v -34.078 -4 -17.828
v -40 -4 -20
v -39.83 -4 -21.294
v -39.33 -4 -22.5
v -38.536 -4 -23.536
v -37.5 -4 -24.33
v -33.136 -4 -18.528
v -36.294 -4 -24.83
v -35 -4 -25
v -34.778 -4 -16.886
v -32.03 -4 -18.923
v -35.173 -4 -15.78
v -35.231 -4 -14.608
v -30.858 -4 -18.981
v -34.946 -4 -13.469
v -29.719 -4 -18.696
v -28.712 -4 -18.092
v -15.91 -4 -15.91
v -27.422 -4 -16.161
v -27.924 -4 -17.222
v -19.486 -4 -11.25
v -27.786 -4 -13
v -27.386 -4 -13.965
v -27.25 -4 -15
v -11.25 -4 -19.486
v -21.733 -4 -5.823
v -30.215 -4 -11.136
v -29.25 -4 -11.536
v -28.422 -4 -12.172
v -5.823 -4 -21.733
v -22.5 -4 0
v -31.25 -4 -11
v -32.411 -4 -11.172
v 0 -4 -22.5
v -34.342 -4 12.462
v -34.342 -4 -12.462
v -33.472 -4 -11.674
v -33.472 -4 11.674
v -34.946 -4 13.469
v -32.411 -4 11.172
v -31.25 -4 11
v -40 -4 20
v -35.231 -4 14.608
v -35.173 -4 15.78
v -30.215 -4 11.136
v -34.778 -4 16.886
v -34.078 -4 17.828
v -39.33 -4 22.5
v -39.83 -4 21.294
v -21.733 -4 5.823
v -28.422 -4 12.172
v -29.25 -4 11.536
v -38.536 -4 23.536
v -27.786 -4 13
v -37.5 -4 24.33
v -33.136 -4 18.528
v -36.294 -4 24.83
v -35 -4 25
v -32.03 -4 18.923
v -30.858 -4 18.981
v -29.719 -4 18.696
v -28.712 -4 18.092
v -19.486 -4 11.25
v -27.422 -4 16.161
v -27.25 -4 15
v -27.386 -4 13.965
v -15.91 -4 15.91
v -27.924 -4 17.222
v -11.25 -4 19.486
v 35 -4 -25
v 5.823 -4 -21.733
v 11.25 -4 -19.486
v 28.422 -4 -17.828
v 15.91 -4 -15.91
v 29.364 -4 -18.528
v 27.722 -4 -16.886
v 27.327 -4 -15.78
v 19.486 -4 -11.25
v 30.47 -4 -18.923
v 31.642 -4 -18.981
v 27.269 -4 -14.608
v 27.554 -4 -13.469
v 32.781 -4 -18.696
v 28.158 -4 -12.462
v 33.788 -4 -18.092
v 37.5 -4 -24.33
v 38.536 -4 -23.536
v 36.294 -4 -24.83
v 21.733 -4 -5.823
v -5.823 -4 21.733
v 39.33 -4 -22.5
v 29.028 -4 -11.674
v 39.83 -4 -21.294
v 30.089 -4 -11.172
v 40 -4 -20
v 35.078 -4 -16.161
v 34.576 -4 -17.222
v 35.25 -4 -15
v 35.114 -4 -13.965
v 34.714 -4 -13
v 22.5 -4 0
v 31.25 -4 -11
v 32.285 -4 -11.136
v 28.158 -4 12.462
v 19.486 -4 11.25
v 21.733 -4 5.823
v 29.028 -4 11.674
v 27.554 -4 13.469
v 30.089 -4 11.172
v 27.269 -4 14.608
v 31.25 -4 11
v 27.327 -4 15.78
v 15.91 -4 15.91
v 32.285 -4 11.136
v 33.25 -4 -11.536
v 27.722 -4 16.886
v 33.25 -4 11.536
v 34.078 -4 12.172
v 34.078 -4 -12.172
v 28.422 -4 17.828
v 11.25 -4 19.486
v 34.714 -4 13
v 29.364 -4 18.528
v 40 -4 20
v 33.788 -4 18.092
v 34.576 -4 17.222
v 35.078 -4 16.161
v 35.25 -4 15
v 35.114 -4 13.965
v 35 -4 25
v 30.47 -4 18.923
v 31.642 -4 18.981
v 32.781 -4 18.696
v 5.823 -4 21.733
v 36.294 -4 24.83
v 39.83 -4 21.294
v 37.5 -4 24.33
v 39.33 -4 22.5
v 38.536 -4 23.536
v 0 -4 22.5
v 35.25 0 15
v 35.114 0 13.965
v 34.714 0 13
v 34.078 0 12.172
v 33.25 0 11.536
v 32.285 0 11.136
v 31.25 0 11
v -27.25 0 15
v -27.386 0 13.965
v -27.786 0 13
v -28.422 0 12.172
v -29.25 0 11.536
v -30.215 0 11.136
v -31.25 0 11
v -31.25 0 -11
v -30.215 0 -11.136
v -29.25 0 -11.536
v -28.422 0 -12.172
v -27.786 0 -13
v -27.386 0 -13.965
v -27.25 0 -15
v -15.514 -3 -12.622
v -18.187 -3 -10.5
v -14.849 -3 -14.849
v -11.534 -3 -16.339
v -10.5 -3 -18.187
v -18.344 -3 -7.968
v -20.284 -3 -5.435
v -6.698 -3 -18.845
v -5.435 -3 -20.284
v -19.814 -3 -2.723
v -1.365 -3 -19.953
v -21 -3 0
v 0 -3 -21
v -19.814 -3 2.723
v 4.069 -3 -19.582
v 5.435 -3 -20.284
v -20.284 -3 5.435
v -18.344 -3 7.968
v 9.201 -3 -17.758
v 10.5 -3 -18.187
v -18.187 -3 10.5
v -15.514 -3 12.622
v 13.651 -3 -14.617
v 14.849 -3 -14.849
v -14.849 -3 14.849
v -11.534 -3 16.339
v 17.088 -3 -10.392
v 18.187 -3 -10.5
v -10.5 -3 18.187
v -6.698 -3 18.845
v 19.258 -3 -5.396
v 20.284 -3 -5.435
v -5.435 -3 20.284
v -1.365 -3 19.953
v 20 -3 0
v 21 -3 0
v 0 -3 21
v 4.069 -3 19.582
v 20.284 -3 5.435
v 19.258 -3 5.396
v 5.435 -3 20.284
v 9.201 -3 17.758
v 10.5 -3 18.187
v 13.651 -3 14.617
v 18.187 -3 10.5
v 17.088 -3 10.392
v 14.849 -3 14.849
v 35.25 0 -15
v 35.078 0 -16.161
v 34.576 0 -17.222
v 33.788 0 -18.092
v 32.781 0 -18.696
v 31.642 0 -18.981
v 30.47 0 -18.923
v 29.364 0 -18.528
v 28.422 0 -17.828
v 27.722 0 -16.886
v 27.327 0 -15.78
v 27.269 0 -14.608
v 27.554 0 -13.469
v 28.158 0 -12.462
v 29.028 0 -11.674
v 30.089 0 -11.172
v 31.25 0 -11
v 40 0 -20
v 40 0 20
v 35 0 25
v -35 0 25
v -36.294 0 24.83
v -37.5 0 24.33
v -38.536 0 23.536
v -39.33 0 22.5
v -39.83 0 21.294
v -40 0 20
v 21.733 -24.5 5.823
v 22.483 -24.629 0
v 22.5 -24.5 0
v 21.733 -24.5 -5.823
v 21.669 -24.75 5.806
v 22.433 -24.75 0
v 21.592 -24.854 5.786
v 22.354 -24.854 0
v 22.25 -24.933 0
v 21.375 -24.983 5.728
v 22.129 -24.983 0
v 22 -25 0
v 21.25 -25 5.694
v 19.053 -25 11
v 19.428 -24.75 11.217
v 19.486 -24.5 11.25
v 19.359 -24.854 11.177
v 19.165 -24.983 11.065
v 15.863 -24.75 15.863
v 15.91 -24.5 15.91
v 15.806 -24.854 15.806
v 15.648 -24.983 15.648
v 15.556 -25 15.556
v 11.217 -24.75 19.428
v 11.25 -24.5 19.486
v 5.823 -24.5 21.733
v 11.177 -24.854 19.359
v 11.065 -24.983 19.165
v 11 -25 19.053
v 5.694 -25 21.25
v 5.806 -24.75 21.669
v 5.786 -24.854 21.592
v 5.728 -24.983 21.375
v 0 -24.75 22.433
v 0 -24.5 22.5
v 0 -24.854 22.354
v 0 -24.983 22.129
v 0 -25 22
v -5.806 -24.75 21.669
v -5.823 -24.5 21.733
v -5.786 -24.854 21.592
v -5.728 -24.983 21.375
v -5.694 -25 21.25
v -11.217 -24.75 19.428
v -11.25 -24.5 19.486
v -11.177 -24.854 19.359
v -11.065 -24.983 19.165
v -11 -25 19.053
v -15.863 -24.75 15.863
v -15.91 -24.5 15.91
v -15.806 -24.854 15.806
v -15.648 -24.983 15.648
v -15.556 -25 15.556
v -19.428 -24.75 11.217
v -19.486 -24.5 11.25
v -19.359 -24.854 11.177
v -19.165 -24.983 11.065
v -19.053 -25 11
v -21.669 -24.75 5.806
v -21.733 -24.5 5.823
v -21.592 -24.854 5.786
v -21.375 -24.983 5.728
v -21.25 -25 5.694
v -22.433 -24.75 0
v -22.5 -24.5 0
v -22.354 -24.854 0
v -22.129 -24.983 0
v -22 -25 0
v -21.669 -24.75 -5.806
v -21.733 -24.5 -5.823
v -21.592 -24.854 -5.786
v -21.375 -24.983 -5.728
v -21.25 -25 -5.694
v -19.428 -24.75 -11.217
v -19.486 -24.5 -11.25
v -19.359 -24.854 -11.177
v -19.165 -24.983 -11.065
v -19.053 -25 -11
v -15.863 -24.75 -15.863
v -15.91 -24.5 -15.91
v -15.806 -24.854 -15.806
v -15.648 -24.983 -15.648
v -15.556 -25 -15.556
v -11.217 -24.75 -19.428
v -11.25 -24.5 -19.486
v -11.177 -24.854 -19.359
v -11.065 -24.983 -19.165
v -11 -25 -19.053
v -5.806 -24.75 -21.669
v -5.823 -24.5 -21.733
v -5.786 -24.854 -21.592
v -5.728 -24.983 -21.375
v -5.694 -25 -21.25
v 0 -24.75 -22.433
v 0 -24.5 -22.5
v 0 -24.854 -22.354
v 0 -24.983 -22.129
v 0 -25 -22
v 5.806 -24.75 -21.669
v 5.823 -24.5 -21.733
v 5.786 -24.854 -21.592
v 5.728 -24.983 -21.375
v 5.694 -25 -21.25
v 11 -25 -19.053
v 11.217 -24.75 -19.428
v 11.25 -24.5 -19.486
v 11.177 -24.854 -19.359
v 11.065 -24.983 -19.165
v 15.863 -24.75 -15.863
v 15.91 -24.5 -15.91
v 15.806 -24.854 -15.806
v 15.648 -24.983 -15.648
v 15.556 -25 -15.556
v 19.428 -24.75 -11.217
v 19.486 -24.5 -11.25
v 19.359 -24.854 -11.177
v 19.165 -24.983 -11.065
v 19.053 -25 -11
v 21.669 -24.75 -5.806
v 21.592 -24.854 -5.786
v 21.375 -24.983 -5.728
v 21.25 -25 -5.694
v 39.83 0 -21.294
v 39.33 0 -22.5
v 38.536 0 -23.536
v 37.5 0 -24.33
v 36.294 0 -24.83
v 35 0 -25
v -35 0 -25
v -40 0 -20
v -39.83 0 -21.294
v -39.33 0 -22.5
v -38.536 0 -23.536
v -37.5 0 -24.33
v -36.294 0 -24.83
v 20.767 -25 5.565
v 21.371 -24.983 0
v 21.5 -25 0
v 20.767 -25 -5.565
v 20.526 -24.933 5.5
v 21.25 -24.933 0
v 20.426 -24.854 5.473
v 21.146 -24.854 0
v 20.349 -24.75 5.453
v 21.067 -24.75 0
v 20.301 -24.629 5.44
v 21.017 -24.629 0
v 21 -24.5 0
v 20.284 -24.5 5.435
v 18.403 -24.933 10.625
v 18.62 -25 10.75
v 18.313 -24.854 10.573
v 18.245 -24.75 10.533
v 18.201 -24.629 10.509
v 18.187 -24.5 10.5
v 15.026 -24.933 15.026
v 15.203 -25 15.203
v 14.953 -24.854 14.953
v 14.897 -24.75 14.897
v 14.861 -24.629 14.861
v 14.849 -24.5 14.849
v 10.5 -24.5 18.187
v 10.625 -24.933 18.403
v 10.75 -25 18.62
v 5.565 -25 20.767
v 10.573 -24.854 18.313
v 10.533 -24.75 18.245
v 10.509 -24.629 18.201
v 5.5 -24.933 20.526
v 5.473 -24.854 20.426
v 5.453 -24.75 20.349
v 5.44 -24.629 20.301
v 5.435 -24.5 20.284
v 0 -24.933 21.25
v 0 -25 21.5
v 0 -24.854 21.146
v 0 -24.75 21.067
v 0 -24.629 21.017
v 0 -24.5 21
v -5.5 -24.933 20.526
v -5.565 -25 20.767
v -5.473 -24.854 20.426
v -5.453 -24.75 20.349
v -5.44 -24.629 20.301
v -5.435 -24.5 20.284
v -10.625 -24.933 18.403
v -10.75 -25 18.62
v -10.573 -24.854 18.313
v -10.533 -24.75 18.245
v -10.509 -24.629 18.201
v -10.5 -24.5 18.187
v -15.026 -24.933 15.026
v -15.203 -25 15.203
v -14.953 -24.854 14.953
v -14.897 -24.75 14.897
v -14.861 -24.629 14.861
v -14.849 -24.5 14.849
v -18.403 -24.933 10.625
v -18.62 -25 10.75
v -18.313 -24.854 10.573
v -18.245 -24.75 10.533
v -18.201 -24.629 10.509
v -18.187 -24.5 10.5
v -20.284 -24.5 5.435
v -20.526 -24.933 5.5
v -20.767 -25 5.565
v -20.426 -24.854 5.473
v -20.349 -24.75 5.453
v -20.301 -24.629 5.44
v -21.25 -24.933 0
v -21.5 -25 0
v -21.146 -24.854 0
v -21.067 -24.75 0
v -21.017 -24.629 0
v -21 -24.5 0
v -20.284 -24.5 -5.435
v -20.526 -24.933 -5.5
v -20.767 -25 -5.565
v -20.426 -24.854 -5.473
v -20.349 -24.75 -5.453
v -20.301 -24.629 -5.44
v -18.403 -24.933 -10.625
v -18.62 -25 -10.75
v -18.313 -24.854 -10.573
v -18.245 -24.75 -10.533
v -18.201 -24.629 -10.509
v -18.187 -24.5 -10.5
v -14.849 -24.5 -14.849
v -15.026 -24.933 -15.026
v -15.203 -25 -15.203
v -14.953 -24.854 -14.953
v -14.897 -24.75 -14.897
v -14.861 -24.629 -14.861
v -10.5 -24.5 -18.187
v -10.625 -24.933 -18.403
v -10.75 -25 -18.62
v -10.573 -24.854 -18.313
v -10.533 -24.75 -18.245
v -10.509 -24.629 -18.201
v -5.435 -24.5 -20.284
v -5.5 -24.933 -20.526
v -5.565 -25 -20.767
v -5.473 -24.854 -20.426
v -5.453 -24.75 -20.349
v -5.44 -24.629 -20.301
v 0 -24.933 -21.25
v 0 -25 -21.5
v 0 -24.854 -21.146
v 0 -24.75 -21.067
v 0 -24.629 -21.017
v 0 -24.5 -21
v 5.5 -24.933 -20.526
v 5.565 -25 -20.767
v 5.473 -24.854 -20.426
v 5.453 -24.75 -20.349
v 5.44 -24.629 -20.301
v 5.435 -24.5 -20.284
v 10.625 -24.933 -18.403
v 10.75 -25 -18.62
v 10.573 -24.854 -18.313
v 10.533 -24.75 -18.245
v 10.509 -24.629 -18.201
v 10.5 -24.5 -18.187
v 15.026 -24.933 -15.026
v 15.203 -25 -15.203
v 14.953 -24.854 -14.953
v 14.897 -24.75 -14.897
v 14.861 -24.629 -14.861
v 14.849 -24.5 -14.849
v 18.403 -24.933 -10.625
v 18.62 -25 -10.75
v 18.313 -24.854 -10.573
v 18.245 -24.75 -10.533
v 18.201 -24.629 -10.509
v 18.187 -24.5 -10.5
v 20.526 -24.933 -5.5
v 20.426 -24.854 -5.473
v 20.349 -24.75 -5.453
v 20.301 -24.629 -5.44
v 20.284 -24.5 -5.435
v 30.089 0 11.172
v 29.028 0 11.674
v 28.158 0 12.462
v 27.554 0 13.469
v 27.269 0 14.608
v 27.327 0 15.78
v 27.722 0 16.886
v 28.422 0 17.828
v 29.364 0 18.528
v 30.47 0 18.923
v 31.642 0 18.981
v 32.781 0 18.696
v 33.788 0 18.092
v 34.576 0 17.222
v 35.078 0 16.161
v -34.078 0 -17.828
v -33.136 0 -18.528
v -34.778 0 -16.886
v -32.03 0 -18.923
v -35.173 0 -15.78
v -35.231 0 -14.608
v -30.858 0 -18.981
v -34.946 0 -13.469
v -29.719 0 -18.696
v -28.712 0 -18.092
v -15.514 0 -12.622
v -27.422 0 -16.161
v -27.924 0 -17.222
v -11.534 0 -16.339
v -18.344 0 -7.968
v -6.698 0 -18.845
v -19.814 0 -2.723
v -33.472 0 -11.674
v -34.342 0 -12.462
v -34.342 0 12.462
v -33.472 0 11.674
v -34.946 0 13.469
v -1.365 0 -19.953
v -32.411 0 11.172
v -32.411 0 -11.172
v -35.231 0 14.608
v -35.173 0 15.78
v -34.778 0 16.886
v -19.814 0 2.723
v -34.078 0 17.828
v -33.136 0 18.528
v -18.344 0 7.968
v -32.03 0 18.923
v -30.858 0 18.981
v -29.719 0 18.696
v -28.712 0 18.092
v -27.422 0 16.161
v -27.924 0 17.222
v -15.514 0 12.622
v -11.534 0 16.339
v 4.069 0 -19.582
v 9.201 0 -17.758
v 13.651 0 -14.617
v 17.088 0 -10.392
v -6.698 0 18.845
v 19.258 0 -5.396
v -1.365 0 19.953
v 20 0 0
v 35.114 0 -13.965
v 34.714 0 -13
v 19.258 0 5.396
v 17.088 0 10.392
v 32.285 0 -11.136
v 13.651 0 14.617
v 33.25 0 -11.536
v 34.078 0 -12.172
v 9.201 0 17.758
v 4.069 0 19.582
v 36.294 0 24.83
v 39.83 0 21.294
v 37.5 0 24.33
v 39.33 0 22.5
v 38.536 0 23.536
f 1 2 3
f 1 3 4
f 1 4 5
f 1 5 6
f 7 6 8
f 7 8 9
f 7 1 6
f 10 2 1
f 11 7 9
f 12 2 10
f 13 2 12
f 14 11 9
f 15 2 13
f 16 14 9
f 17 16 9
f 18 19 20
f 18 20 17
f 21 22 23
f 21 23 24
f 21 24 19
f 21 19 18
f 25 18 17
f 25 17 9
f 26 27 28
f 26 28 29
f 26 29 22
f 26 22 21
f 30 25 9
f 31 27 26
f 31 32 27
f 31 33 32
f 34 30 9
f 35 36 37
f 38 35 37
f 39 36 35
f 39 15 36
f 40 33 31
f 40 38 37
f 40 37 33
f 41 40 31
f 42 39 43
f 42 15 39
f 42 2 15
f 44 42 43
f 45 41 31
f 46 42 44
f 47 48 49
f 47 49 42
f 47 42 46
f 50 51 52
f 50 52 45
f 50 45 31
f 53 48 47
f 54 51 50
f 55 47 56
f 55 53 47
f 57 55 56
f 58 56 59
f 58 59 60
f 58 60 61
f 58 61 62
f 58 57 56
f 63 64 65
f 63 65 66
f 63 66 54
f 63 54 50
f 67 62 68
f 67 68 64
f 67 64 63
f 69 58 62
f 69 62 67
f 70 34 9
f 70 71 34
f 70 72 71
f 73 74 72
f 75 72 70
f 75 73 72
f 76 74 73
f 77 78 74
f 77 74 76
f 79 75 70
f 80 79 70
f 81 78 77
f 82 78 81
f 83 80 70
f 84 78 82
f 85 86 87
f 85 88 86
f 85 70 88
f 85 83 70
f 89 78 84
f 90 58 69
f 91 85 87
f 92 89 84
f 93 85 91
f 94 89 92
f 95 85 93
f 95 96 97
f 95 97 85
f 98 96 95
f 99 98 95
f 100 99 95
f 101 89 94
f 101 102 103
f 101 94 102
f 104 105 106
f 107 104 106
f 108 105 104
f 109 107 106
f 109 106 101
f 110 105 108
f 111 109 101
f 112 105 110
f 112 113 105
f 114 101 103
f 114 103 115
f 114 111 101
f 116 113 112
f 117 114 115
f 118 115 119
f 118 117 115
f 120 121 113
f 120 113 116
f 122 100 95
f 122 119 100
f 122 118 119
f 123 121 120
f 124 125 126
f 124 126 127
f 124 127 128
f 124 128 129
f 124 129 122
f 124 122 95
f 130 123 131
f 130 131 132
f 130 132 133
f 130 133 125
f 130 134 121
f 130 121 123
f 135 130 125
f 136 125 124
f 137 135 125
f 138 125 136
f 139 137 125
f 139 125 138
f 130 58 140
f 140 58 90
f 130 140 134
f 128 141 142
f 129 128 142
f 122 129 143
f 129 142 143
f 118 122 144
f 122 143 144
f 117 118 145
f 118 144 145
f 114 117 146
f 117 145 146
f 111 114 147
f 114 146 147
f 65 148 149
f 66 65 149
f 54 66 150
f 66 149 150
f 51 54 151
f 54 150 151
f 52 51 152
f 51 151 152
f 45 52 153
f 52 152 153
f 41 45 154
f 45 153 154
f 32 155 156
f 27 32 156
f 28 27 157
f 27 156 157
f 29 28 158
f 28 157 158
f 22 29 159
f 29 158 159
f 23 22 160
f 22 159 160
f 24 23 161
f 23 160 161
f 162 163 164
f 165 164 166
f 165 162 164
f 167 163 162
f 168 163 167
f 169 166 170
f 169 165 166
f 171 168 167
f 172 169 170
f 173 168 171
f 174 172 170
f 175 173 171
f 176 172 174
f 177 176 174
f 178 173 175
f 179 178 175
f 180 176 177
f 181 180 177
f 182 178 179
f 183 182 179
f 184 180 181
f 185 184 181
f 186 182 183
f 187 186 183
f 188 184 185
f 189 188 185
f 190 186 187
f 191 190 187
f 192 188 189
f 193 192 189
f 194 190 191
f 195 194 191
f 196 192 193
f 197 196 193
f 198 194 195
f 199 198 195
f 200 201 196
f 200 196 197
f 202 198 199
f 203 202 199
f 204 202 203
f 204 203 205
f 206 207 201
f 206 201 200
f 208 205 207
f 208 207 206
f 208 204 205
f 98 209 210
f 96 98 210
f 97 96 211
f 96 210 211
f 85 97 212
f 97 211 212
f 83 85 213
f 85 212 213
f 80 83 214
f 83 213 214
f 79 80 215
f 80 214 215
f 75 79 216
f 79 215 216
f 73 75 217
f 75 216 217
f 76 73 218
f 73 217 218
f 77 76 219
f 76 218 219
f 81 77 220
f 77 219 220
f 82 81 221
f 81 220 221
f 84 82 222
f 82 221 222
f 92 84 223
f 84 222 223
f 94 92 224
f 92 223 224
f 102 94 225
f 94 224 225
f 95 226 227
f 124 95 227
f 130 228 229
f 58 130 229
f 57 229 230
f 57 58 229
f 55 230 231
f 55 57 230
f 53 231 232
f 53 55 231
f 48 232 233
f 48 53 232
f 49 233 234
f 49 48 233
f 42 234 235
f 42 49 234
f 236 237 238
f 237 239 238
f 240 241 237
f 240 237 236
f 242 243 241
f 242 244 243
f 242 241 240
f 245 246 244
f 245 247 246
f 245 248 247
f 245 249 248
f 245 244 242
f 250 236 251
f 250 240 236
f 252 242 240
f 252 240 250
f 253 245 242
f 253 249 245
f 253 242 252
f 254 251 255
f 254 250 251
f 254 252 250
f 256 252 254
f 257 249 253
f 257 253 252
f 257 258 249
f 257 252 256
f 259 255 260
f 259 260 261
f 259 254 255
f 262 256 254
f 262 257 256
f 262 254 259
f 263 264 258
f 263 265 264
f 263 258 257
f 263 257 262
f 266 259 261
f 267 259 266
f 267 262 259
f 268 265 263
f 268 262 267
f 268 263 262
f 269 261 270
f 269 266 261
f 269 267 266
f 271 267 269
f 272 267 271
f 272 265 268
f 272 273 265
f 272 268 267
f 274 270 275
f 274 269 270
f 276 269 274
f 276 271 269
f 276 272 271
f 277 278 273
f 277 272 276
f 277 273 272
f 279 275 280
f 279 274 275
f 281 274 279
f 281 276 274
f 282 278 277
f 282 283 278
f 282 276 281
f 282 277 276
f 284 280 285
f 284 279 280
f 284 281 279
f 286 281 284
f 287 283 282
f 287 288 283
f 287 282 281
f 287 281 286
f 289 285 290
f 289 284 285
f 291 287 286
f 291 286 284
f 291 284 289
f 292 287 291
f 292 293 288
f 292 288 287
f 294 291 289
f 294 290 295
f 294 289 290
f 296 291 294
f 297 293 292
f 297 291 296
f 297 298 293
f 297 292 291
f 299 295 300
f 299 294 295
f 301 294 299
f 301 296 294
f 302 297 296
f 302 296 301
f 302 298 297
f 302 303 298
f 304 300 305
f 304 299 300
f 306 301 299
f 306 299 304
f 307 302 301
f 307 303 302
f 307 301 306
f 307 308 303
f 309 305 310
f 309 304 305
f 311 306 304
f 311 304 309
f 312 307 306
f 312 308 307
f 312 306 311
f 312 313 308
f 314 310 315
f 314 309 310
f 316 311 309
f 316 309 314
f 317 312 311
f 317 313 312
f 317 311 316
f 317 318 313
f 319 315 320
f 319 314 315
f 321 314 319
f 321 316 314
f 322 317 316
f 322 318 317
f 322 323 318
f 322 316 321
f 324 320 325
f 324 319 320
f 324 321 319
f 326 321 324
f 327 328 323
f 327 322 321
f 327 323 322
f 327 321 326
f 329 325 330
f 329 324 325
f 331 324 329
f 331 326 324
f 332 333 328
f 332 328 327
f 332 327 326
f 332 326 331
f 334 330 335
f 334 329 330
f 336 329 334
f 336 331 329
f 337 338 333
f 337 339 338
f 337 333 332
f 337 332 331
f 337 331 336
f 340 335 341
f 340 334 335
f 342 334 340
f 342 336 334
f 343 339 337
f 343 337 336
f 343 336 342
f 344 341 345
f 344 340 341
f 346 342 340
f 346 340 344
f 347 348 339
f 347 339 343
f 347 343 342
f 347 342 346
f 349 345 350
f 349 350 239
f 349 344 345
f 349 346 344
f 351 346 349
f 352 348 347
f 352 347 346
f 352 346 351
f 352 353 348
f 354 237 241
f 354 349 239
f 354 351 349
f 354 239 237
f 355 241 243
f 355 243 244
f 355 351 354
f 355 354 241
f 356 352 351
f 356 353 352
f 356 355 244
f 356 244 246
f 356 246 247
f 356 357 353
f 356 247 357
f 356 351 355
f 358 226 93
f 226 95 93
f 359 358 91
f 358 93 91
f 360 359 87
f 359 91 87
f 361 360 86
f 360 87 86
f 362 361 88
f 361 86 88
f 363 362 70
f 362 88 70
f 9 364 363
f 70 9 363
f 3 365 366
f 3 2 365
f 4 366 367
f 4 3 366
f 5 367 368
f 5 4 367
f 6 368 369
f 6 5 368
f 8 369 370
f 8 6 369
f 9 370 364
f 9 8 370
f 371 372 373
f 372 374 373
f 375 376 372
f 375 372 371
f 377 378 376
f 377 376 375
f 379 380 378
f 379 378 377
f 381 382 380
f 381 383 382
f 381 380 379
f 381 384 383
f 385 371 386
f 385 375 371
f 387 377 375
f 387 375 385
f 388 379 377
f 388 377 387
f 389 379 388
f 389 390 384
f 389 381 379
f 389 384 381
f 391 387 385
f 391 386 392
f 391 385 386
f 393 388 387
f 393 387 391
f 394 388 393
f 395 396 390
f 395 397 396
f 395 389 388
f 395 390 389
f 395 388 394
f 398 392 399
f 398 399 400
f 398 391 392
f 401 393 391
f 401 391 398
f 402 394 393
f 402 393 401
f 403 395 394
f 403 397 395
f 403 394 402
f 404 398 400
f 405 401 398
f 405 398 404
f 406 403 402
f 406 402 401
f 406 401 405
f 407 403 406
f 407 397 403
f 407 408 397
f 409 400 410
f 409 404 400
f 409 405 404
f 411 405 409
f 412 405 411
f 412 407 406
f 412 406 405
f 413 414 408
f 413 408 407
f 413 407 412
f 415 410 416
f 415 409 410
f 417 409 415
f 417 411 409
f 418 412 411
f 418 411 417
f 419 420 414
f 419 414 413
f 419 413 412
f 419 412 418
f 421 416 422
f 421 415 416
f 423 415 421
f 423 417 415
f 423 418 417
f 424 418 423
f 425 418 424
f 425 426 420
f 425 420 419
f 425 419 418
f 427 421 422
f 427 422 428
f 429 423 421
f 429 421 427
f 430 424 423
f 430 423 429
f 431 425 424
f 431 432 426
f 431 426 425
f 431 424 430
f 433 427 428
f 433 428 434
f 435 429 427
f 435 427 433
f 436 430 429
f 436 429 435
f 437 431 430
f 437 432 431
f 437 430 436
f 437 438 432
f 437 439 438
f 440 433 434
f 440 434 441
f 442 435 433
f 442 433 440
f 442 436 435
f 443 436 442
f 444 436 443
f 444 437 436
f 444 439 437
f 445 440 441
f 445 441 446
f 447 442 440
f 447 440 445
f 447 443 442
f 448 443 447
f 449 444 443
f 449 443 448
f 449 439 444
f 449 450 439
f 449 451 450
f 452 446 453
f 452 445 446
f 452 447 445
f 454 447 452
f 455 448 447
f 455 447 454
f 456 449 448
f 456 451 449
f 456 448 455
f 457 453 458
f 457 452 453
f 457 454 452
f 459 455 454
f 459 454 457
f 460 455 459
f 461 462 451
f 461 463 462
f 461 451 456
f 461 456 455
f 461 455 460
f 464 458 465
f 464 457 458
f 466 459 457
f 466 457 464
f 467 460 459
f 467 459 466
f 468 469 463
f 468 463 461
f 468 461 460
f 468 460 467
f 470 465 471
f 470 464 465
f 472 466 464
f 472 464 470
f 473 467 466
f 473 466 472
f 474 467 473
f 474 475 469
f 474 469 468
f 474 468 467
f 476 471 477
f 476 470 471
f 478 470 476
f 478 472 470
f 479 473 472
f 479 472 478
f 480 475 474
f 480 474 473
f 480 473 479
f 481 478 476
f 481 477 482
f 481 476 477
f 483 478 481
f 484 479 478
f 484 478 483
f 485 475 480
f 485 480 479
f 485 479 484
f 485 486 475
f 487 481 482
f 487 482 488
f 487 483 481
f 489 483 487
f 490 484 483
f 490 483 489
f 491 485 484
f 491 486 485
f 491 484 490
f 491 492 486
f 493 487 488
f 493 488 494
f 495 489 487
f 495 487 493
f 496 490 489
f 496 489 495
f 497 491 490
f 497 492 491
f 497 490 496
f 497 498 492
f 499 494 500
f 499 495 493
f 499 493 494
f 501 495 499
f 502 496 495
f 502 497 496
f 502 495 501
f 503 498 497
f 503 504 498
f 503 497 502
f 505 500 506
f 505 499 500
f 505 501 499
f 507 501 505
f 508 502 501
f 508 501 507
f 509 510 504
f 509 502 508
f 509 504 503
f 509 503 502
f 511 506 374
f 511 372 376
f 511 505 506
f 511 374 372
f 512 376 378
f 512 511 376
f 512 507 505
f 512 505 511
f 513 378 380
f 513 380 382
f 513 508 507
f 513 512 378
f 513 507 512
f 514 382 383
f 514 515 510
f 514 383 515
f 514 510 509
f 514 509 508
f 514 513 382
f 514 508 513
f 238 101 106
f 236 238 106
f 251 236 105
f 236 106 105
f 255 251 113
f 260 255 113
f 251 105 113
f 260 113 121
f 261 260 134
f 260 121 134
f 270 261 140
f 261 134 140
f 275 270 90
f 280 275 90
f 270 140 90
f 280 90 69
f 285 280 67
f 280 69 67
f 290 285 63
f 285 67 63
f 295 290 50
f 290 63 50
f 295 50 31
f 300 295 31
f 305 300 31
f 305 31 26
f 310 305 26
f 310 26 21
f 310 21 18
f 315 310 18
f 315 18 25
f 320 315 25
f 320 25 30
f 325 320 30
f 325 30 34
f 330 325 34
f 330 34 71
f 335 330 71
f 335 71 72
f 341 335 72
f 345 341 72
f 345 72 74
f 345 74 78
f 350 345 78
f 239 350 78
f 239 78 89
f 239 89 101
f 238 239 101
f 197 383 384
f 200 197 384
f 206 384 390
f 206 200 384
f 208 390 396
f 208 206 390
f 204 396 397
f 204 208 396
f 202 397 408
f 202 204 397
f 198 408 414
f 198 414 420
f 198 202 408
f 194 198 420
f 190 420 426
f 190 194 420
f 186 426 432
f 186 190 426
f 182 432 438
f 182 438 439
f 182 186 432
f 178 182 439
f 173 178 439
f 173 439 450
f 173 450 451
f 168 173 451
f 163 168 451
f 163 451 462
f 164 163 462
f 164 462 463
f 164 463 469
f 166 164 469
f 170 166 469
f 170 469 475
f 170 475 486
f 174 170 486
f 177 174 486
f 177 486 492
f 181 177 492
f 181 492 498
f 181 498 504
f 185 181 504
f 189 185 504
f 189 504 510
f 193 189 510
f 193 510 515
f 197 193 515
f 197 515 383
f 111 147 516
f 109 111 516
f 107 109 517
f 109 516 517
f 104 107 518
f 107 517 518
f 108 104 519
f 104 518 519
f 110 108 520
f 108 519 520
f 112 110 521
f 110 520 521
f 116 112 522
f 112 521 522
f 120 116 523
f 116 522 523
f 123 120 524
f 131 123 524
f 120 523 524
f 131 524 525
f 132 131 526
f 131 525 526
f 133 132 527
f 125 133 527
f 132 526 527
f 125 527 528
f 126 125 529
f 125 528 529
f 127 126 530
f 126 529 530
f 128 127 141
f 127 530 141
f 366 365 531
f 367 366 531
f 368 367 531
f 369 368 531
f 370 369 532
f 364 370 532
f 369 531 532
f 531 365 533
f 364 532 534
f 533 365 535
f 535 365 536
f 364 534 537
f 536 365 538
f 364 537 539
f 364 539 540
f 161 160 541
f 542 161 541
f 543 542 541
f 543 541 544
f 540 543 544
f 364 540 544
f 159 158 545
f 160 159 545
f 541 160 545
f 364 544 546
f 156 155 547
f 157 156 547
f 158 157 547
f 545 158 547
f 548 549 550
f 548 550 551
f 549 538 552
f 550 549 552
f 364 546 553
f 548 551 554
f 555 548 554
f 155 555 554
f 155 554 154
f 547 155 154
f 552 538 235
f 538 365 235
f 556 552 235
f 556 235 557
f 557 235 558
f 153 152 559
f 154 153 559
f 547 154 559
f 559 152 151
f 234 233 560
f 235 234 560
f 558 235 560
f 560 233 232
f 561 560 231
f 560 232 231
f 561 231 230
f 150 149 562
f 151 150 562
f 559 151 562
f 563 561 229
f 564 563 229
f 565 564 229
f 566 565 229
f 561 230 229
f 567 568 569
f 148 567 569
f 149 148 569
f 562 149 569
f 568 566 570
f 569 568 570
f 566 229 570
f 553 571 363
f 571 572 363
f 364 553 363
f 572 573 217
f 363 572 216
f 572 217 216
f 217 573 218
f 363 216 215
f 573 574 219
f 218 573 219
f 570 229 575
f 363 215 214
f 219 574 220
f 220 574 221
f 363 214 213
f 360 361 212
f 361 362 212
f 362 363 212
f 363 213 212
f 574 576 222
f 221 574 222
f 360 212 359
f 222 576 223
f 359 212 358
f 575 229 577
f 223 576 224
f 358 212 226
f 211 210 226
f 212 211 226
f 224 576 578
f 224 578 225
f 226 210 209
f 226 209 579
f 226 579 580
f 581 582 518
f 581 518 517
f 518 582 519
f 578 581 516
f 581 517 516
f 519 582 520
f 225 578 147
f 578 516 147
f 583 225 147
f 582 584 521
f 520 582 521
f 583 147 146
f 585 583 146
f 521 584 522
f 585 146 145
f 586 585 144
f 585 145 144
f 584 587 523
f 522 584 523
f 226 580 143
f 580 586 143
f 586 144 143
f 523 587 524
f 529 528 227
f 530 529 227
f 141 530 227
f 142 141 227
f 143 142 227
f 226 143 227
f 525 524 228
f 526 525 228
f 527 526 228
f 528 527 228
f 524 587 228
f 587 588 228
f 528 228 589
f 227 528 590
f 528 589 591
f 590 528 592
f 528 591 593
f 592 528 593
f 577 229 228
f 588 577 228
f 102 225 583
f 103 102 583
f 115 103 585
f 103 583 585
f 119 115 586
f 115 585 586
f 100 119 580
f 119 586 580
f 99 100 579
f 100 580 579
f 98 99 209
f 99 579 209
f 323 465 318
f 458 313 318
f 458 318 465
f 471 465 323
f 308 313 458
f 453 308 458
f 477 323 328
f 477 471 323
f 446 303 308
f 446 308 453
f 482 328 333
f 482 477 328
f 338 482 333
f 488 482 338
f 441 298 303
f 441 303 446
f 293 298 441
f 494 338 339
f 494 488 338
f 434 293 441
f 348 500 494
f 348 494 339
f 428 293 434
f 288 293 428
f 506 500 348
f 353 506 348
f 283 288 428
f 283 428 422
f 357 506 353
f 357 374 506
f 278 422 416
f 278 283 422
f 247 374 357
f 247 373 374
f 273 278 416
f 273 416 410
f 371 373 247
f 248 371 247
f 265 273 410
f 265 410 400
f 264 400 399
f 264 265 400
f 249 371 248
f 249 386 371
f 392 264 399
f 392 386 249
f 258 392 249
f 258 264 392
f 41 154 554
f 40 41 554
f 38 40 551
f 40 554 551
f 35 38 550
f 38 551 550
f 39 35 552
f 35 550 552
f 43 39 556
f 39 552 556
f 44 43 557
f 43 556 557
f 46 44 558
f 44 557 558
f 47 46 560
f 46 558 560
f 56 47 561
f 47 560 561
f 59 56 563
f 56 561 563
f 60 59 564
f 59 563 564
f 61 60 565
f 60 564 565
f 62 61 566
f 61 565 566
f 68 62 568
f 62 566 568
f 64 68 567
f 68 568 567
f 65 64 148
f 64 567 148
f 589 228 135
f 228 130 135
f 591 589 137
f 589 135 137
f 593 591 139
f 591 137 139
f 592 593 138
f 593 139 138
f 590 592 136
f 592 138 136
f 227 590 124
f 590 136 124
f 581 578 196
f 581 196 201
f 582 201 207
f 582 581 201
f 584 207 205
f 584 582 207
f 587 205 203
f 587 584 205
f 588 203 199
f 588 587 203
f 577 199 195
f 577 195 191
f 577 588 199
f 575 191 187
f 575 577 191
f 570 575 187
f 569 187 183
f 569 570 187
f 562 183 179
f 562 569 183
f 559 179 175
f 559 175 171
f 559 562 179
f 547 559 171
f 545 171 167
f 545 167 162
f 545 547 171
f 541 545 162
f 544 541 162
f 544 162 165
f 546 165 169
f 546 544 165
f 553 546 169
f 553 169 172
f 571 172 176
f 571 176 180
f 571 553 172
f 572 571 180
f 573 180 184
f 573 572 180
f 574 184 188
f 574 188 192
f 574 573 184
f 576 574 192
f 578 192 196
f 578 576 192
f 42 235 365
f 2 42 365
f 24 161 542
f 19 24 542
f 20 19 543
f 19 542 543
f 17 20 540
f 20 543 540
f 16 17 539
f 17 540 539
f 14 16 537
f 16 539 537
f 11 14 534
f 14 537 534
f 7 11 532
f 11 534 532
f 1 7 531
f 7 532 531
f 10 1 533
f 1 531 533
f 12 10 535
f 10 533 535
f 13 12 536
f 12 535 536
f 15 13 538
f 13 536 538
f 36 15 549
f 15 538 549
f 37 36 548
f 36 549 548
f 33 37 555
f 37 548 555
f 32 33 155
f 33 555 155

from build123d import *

# Parameters (mm, degrees)
F0_R     = 22.5
F1_DEPTH = 4
F0_R_2   = 21
F2_DEPTH = 25
F3_R     = 5
F4_R     = 0.5
F0_R_3   = 20
F5_DEPTH = 3


with BuildPart() as f1:
    # F0 (on Front) → F1 (new body)
    with BuildSketch(Plane.XZ):
        Polygon((40, 25), (-40, 25), (-40, 0), (-40, -25), (40, -25), (40, 0), align=None)
        with BuildLine():
            ThreePointArc((-27.25, -15), (-34.078427, -17.828427), (-31.25, -11))
            ThreePointArc((-31.25, -11), (-28.421573, -12.171573), (-27.25, -15))
        make_face(mode=Mode.SUBTRACT)
        with BuildLine():
            ThreePointArc((35.25, -15), (28.421573, -17.828427), (31.25, -11))
            ThreePointArc((31.25, -11), (34.078427, -12.171573), (35.25, -15))
        make_face(mode=Mode.SUBTRACT)
        with BuildLine():
            ThreePointArc((-27.25, 15), (-28.421573, 12.171573), (-31.25, 11))
            ThreePointArc((-31.25, 11), (-34.078427, 17.828427), (-27.25, 15))
        make_face(mode=Mode.SUBTRACT)
        Circle(F0_R, mode=Mode.SUBTRACT)
        with BuildLine():
            ThreePointArc((35.25, 15), (34.078427, 12.171573), (31.25, 11))
            ThreePointArc((31.25, 11), (28.421573, 17.828427), (35.25, 15))
        make_face(mode=Mode.SUBTRACT)
    extrude(amount=F1_DEPTH)

    # F0 (on Front) → F2 (join)
    with BuildSketch(Plane.XZ):
        Circle(F0_R)
        Circle(F0_R_2, mode=Mode.SUBTRACT)
    extrude(amount=F2_DEPTH)

    # F3
    f3_edges = [f1.edges().sort_by_distance(p)[0] for p in [
        (-40, -2, -25),
        (-40, -2, 25),
        (40, -2, 25),
        (40, -2, -25),
    ]]
    fillet(f3_edges, radius=F3_R)

    # F4
    f4_edges = [f1.edges().sort_by_distance(p)[0] for p in [
        (-22.5, -25, 0),
        (-21, -25, 0),
    ]]
    fillet(f4_edges, radius=F4_R)

    # F0 (on Front) → F5 (join)
    with BuildSketch(Plane.XZ):
        Circle(F0_R_2)
        Circle(F0_R_3, mode=Mode.SUBTRACT)
    extrude(amount=F5_DEPTH)


solid = f1.part
